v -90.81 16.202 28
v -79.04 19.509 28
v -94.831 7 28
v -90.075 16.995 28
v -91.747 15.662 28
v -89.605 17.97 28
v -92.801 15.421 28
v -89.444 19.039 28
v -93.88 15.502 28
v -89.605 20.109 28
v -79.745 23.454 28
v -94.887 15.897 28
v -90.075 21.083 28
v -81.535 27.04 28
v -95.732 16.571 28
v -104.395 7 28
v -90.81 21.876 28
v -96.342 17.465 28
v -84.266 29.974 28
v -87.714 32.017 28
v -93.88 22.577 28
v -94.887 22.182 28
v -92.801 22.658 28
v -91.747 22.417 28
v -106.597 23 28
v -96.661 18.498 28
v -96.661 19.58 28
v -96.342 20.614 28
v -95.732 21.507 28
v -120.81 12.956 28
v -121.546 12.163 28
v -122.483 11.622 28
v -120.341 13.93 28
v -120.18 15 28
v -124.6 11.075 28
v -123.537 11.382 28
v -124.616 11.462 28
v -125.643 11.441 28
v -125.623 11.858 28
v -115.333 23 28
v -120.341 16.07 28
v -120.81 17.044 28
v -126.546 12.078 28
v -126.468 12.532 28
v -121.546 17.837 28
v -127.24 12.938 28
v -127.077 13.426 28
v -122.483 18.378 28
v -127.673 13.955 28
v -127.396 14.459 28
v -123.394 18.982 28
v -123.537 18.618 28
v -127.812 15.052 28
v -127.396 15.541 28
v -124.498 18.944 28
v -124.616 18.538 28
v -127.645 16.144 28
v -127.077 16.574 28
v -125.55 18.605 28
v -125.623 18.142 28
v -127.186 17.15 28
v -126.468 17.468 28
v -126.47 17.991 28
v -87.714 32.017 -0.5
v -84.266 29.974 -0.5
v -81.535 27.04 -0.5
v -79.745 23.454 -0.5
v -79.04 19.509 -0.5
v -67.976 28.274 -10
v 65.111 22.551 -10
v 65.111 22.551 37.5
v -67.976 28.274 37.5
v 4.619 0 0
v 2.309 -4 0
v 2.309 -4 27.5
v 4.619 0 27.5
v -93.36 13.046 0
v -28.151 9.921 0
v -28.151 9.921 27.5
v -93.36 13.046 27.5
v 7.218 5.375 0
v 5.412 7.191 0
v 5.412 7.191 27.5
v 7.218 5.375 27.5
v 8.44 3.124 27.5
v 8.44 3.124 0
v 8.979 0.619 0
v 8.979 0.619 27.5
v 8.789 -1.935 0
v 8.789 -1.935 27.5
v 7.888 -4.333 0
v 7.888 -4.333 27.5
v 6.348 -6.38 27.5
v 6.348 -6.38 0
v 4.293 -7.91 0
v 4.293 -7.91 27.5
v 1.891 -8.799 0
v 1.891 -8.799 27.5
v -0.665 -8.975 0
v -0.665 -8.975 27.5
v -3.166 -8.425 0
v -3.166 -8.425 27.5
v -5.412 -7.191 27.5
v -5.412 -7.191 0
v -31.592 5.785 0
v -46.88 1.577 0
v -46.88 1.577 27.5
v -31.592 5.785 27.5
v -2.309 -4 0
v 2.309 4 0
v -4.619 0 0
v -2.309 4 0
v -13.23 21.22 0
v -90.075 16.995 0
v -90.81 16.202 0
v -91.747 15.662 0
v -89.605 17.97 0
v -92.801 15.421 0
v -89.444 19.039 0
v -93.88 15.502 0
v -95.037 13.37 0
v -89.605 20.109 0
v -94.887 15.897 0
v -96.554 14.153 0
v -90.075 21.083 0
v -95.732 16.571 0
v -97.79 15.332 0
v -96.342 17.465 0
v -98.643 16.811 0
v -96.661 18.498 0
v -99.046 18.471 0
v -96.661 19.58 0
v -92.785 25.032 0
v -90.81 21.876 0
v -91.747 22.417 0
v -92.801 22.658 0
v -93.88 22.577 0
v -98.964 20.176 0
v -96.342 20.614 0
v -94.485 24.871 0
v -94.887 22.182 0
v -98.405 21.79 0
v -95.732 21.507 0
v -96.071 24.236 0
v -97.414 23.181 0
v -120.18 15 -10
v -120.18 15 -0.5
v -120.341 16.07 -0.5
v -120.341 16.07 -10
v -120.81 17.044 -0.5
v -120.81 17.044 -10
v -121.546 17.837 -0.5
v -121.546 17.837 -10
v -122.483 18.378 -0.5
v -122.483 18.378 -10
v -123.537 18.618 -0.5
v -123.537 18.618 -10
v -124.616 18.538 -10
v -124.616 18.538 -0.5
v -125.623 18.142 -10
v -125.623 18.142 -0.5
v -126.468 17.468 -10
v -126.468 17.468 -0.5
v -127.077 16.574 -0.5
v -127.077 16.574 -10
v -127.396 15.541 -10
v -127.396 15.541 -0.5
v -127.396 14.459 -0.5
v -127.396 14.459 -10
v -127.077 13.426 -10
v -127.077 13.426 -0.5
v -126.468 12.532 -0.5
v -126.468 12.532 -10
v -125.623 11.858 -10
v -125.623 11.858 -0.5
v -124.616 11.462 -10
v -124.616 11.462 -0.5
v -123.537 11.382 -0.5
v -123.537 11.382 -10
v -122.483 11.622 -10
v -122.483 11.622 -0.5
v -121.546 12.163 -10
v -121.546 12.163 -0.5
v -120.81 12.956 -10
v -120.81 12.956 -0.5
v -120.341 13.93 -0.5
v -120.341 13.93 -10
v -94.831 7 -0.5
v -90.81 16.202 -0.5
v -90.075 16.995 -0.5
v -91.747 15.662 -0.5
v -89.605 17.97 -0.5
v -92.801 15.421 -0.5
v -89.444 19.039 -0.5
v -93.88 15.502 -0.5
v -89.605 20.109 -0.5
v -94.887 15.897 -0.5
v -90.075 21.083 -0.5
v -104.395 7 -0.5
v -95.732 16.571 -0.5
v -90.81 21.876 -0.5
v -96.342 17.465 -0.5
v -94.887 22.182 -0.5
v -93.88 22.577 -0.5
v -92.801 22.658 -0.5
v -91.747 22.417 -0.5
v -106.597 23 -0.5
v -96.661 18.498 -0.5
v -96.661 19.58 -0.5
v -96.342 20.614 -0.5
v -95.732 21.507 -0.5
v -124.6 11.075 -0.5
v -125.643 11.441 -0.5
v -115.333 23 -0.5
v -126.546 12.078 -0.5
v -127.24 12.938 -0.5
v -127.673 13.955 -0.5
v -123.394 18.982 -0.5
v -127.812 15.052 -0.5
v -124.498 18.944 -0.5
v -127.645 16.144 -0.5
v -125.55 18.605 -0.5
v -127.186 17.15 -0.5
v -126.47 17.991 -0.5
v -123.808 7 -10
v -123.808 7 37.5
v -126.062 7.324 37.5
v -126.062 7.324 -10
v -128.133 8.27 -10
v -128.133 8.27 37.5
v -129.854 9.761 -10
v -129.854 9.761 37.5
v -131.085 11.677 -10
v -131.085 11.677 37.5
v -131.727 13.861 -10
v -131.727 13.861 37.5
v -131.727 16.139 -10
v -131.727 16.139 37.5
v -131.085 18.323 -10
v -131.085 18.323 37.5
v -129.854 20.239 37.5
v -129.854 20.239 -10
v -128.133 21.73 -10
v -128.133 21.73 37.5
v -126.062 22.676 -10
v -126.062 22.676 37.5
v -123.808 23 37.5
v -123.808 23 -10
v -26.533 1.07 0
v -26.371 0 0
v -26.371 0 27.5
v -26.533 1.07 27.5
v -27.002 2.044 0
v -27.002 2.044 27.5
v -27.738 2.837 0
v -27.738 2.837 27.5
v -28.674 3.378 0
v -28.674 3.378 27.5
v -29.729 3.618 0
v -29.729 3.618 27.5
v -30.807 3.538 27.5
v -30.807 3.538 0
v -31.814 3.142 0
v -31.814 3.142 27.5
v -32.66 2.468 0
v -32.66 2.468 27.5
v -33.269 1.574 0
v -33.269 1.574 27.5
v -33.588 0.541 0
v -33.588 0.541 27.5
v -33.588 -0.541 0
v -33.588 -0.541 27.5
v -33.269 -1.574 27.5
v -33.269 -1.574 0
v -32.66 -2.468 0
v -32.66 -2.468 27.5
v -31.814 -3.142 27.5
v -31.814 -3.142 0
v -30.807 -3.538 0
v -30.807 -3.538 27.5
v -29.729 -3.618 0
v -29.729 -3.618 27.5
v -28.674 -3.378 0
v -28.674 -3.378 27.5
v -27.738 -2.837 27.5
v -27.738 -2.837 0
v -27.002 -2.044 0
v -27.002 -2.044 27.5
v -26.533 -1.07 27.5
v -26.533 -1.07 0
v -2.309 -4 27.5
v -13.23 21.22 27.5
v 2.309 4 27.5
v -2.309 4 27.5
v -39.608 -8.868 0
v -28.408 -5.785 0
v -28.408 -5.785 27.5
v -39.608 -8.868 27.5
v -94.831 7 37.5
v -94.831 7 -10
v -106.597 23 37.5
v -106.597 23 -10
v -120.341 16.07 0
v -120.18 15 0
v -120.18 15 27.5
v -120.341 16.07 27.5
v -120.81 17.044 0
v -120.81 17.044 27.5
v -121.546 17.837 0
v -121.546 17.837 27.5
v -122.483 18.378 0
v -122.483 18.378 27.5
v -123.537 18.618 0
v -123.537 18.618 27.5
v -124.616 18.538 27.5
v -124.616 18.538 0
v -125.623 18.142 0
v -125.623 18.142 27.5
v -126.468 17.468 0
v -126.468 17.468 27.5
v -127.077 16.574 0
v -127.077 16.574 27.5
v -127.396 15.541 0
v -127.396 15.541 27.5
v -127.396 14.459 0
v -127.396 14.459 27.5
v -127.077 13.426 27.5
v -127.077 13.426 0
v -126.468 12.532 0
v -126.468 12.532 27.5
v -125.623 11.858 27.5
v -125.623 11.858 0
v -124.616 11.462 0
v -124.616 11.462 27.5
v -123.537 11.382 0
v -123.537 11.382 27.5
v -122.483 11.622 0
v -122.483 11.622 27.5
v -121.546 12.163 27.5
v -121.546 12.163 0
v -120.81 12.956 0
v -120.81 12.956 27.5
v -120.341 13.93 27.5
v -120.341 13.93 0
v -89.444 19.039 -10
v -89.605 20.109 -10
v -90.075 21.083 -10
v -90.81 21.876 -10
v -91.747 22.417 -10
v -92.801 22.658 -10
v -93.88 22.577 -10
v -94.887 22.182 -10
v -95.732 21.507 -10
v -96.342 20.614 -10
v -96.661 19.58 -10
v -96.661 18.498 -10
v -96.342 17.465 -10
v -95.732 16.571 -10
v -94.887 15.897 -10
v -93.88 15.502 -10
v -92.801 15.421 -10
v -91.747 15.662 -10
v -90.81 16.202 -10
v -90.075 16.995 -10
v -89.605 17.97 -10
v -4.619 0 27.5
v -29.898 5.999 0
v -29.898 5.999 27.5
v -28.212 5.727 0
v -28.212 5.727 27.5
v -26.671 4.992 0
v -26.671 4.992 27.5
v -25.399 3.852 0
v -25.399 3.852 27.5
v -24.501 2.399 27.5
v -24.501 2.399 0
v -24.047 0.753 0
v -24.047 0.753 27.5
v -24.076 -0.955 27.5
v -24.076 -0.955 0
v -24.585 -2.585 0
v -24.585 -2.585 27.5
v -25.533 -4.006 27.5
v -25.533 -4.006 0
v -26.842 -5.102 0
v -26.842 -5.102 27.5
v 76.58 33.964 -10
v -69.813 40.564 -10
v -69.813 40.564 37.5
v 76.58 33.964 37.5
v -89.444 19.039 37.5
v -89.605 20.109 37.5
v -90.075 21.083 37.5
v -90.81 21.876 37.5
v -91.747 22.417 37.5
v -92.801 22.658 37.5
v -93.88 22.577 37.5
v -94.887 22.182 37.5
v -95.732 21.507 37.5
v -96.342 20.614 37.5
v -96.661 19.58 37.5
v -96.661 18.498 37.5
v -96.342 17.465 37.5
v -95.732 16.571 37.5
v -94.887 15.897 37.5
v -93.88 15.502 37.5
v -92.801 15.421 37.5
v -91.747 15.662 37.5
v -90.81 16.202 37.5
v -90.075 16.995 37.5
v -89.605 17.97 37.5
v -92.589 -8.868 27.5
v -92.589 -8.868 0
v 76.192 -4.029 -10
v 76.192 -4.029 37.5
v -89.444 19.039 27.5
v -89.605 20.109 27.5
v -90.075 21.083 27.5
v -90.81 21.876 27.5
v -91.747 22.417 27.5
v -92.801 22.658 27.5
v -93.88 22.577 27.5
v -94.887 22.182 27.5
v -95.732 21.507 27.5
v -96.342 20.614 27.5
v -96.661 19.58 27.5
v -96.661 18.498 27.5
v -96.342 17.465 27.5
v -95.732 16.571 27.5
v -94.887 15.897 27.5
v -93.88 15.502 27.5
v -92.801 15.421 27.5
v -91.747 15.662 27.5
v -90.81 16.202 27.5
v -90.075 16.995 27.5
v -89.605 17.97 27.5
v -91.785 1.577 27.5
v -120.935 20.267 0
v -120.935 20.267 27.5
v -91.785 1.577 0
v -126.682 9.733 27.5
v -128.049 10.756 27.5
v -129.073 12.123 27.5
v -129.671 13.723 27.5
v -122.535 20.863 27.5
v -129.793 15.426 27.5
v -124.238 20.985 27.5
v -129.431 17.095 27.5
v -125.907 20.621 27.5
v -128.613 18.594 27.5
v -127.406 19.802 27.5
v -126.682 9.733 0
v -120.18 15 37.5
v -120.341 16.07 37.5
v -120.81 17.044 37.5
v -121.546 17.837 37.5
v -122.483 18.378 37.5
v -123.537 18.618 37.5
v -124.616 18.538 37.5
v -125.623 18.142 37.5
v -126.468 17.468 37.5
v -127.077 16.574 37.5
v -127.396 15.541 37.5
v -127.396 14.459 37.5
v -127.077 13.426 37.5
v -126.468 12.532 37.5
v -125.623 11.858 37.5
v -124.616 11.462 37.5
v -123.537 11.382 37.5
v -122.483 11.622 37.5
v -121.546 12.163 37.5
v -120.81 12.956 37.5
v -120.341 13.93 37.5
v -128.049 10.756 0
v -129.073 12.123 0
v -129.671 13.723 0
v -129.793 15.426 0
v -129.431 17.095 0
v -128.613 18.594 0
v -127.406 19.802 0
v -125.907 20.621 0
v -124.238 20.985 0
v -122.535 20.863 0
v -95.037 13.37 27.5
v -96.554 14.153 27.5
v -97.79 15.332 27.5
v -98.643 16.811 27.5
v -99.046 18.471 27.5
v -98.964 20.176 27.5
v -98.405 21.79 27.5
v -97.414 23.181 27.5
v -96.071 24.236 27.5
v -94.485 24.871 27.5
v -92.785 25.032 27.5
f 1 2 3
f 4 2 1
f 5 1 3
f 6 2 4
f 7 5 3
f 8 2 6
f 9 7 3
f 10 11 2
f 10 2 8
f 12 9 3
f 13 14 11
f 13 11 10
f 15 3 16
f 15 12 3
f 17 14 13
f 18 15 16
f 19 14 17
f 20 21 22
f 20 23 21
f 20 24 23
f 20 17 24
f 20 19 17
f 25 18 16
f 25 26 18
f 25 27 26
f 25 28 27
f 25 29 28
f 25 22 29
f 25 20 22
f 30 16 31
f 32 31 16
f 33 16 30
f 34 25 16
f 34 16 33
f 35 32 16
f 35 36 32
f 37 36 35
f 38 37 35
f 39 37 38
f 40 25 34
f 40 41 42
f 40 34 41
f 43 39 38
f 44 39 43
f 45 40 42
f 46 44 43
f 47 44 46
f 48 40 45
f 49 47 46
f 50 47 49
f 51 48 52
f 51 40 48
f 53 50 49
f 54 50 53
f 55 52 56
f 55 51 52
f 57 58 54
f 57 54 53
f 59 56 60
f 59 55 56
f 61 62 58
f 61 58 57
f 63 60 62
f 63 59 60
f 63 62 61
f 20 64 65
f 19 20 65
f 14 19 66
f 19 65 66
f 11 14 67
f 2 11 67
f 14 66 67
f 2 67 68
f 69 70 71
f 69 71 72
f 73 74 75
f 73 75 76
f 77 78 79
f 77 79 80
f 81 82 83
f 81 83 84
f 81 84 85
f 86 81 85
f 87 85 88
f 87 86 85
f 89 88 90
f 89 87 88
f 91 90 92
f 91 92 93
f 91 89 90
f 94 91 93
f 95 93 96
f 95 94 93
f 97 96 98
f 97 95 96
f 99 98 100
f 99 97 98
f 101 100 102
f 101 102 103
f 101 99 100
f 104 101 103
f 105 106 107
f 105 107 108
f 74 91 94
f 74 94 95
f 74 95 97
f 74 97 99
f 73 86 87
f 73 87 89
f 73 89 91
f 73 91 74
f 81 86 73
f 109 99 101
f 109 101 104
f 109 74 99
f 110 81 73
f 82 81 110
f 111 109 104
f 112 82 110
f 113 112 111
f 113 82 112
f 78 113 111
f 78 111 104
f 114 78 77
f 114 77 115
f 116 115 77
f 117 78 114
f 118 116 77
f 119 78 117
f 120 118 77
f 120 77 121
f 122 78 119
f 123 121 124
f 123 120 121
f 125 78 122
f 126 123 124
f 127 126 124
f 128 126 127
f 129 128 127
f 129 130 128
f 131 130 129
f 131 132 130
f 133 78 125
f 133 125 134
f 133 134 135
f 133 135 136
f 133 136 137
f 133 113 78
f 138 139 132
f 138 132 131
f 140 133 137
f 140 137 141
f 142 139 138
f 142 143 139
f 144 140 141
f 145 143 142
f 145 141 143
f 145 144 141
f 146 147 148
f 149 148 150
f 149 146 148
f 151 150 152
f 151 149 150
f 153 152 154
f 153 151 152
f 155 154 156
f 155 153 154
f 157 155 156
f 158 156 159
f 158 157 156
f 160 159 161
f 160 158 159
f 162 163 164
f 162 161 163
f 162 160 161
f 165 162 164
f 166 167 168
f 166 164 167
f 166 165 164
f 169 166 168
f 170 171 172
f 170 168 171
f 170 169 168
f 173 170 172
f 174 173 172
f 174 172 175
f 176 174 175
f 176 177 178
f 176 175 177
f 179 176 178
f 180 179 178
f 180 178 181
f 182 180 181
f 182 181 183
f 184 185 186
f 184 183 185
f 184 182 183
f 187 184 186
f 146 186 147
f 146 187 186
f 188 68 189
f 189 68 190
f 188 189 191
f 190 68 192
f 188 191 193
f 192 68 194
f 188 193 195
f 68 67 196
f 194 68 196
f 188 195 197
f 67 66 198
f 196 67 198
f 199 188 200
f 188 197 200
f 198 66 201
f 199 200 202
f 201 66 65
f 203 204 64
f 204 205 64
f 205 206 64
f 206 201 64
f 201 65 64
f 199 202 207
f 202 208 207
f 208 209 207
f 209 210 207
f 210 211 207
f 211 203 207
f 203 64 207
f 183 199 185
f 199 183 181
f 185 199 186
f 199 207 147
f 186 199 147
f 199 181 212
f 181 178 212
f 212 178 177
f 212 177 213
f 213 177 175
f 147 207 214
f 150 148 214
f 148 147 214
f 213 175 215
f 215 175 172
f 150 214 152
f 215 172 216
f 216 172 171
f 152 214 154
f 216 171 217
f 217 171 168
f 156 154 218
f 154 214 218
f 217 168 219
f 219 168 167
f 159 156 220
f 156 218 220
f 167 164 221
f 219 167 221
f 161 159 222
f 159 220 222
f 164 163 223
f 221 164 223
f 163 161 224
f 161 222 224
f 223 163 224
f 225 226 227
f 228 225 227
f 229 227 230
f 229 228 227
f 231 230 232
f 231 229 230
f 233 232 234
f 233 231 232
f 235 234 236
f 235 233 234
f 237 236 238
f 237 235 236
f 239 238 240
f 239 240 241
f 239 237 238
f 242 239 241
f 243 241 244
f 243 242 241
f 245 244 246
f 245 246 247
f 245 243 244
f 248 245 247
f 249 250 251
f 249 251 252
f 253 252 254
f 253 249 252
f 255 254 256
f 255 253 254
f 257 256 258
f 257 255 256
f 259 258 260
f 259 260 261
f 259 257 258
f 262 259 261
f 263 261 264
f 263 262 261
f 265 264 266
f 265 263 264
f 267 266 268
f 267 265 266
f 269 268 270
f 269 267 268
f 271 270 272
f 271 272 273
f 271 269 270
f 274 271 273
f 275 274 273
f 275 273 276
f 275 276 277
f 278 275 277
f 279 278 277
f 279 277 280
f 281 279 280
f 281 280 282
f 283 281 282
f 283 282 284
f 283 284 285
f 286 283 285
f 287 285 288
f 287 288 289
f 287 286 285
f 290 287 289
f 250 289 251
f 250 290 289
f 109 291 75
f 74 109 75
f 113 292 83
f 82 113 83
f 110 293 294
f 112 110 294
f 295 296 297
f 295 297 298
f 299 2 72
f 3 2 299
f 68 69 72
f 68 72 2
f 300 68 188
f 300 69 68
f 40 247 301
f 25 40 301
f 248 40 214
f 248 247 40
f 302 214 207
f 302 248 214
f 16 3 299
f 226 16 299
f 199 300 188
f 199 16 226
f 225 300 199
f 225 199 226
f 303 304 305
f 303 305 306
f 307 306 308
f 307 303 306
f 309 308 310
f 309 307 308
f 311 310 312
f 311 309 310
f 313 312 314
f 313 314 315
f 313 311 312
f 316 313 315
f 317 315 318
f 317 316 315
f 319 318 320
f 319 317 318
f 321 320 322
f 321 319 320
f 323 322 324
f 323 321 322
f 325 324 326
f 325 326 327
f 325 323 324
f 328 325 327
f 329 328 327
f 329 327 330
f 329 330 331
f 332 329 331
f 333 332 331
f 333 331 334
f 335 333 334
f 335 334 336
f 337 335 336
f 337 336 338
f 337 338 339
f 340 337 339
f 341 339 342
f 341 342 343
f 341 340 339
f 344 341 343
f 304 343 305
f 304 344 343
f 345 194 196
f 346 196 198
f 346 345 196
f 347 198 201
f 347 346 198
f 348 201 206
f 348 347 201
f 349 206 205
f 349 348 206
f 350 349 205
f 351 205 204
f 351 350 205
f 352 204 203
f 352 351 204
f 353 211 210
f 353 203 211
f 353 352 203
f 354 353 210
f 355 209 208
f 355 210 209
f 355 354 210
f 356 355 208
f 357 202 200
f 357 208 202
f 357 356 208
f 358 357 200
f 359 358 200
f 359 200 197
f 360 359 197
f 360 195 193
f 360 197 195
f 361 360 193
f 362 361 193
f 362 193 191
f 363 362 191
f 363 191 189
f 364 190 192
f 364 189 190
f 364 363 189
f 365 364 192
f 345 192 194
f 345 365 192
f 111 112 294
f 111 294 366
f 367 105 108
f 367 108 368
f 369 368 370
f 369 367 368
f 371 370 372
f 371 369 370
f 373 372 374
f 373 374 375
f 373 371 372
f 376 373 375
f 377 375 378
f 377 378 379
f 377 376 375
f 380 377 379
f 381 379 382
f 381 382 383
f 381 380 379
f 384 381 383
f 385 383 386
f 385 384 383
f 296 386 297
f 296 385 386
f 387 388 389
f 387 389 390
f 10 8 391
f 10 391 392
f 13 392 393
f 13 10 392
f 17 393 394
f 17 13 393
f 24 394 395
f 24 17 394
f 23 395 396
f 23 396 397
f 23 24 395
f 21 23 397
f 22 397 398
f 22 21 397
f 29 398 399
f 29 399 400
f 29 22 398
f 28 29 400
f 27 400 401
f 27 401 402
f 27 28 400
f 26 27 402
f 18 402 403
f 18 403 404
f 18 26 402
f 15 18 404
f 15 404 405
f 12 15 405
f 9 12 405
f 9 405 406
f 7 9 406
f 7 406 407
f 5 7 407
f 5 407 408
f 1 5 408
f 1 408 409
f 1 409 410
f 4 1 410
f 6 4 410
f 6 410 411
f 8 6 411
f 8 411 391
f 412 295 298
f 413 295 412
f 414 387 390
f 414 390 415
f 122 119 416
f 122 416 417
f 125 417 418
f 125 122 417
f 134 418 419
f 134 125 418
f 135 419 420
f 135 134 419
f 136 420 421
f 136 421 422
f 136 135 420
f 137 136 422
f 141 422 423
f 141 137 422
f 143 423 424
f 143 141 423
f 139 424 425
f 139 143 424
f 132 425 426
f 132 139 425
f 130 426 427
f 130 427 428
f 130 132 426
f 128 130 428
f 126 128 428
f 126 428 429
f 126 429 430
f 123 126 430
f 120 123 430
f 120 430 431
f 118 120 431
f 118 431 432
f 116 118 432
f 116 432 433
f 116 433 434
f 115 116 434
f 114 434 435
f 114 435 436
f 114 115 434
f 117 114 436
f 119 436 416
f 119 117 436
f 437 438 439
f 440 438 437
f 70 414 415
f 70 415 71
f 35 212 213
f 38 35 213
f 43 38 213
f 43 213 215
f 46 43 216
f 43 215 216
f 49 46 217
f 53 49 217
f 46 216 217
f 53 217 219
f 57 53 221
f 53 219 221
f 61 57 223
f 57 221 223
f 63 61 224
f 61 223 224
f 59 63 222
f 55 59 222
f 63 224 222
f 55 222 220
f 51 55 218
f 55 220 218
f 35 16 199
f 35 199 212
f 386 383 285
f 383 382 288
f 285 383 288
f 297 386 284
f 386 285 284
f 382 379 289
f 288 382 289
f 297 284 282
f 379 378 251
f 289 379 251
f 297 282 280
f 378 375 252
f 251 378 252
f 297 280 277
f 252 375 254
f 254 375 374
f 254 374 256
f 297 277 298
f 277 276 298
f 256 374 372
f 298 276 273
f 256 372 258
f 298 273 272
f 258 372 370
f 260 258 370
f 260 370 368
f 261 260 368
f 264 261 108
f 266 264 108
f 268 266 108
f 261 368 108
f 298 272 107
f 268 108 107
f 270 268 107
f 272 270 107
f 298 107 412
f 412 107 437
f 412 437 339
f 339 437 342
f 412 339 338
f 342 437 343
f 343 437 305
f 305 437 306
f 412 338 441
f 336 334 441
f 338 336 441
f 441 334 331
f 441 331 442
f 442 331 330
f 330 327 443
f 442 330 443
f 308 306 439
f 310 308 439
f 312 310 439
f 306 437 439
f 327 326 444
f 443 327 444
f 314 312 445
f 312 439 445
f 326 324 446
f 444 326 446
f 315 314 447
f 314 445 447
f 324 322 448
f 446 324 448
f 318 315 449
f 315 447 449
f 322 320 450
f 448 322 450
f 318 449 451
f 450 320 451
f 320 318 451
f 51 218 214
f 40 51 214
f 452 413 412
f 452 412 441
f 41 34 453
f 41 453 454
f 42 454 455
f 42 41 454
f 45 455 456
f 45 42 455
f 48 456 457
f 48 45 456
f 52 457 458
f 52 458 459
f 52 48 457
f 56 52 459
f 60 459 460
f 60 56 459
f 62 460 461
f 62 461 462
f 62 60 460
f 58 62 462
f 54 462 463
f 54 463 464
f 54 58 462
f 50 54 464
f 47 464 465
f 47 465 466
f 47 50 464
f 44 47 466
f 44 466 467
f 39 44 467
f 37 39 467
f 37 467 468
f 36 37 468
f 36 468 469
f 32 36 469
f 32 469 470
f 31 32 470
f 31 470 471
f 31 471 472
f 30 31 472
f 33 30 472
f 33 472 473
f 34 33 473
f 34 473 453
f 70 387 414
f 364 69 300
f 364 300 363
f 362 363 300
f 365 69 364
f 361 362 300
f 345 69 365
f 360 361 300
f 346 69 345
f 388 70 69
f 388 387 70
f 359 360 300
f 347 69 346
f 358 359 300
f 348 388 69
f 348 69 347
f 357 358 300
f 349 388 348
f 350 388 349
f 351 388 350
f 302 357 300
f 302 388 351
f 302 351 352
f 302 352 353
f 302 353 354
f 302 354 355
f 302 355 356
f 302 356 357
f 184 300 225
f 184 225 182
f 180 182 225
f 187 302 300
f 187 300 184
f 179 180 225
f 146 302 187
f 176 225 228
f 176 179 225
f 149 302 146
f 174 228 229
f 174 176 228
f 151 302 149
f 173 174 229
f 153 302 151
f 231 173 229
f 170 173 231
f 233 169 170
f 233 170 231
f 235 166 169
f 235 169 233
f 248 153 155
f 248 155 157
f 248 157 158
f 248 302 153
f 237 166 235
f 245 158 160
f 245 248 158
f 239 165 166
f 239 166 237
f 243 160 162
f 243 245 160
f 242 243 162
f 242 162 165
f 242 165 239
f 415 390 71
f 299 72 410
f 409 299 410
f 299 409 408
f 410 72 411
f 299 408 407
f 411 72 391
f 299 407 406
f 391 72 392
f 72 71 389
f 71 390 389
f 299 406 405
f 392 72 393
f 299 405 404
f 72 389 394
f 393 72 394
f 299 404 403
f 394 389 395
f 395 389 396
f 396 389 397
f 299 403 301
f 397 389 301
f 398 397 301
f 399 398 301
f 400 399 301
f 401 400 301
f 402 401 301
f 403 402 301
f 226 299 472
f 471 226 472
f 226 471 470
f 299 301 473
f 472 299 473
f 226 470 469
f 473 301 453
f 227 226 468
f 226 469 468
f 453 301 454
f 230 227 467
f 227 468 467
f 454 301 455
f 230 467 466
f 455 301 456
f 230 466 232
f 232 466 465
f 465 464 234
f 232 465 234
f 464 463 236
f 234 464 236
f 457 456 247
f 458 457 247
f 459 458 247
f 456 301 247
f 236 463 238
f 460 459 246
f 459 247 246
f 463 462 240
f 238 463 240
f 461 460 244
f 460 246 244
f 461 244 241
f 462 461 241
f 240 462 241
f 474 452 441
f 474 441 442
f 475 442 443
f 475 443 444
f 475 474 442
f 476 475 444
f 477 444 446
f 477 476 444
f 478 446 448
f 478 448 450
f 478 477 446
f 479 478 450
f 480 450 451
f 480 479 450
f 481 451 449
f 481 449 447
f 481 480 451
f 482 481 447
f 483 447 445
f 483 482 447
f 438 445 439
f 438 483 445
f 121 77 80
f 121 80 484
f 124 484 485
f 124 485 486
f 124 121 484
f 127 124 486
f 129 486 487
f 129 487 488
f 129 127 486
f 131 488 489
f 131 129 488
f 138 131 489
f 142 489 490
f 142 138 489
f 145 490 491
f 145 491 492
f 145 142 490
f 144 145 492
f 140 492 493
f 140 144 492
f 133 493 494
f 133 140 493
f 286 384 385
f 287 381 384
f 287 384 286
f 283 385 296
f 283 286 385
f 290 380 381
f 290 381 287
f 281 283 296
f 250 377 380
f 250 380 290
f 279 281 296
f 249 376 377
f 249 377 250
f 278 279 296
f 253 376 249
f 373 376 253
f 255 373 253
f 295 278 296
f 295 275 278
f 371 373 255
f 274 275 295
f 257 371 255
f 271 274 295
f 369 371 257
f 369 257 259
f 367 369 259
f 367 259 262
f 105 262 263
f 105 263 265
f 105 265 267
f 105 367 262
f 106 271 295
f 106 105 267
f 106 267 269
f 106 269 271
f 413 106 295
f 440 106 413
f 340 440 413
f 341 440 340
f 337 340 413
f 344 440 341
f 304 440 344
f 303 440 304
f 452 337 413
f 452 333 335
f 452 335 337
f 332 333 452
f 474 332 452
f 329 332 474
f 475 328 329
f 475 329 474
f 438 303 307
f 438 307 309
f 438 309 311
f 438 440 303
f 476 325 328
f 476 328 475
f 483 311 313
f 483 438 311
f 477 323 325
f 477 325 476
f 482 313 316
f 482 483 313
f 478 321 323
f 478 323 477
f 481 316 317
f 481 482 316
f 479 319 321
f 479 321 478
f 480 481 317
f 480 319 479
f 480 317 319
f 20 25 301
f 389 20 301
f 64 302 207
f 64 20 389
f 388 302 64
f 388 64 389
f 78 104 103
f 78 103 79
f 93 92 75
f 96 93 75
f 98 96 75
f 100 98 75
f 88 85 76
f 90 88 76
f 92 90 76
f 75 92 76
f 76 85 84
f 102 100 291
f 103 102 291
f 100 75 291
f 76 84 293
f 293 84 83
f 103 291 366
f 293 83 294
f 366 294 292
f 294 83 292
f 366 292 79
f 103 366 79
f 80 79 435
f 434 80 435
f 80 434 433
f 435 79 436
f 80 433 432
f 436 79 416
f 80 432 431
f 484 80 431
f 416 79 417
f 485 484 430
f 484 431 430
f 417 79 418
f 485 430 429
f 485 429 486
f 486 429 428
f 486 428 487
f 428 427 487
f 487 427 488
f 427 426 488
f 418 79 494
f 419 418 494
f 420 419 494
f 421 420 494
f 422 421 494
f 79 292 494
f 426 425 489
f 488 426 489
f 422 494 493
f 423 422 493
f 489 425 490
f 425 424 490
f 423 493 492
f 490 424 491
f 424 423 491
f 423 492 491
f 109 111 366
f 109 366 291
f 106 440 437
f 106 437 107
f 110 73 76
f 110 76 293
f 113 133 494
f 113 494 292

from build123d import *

# Parameters (mm, degrees)
SKETCH5_R                = 3.628504089
BOSS_EXTRUDE3_DEPTH      = 27.5
BOSS_EXTRUDE3_2_DEPTH    = 27.5
BOSS_EXTRUDE4_DEPTH      = 23.75
BOSS_EXTRUDE4_DEPTH_BACK = 23.75
SKETCH6_R                = 3.628504089
CUT_EXTRUDE2_DEPTH       = 14.25
CUT_EXTRUDE2_DEPTH_BACK  = 14.25


with BuildPart() as part:
    # Sketch5 → Boss-Extrude3 (new body)
    with BuildSketch(Plane.XY):
        with BuildLine():
            Line((-120.934685686, 20.267091554), (-91.785043878, 1.576891431))
            Line((-91.785043878, 1.576891431), (-46.879701458, 1.576891431))
            Line((-46.879701458, 1.576891431), (-31.592321802, 5.78485188))
            ThreePointArc((-31.592321802, 5.78485188), (-24.21514812, 1.592321802), (-28.407678198, -5.78485188))
            Line((-28.407678198, -5.78485188), (-39.607557444, -8.867698645))
            Line((-39.607557444, -8.867698645), (-92.588788243, -8.867698645))
            Line((-92.588788243, -8.867698645), (-126.681944707, 9.732908446))
            ThreePointArc((-126.681944707, 9.732908446), (-129.07540675, 17.87362951), (-120.934685686, 20.267091554))
        make_face()
        with Locations((-123.808315196, 15)):
            Circle(SKETCH5_R, mode=Mode.SUBTRACT)
        with Locations((-30, 0)):
            Circle(SKETCH5_R, mode=Mode.SUBTRACT)
    extrude(amount=BOSS_EXTRUDE3_DEPTH)


with BuildPart() as body_2:
    # Sketch5 → Boss-Extrude3 2 (new body)
    with BuildSketch(Plane.XY):
        with BuildLine():
            Line((-5.4116656, -7.191236016), (-28.151470977, 9.921291265))
            Line((-28.151470977, 9.921291265), (-93.359787057, 13.046109847))
            ThreePointArc((-93.359787057, 13.046109847), (-99.065716006, 19.326426306), (-92.785399546, 25.032355255))
            Line((-92.785399546, 25.032355255), (-13.230357407, 21.220033624))
            Line((-13.230357407, 21.220033624), (5.4116656, 7.191236016))
            ThreePointArc((5.4116656, 7.191236016), (7.191236016, -5.4116656), (-5.4116656, -7.191236016))
        make_face()
        with Locations((-93.072593302, 19.039232551)):
            Circle(SKETCH5_R, mode=Mode.SUBTRACT)
        Polygon((4.618802154, 0), (2.309401077, 4), (-2.309401077, 4), (-4.618802154, 0), (-2.309401077, -4), (2.309401077, -4), align=None, mode=Mode.SUBTRACT)
    extrude(amount=BOSS_EXTRUDE3_2_DEPTH)


with BuildPart() as body_3:
    # Sketch6 → Boss-Extrude4 (new, two sides: drawn at the far end of the back side and taken through both)
    with BuildSketch(Plane.XY.offset(13.75).offset(-BOSS_EXTRUDE4_DEPTH_BACK)):
        with BuildLine():
            Line((76.191684804, -4.029010555), (65.11100303, 22.550984249))
            Line((65.11100303, 22.550984249), (-67.97614227, 28.273511334))
            Line((-67.97614227, 28.273511334), (-94.831118395, 7))
            Line((-94.831118395, 7), (-123.808315196, 7))
            ThreePointArc((-123.808315196, 7), (-131.808315196, 15), (-123.808315196, 23))
            Line((-123.808315196, 23), (-106.597039785, 23))
            Line((-106.597039785, 23), (-69.813407938, 40.564082784))
            Line((-69.813407938, 40.564082784), (76.579517734, 33.963718739))
            Line((76.579517734, 33.963718739), (76.191684804, -4.029010555))
        make_face()
        with Locations((-93.072593302, 19.039232551)):
            Circle(SKETCH6_R, mode=Mode.SUBTRACT)
        with Locations((-123.808315196, 15)):
            Circle(SKETCH6_R, mode=Mode.SUBTRACT)
    extrude(amount=BOSS_EXTRUDE4_DEPTH + BOSS_EXTRUDE4_DEPTH_BACK)

    # Sketch7 → Cut-Extrude2 (cut, two sides: drawn at the far end of the back side and taken through both)
    with BuildSketch(Plane.XY.offset(13.75).offset(-CUT_EXTRUDE2_DEPTH_BACK)):
        with BuildLine():
            Line((-123.39375762, 18.98225228), (-95.551874481, 32.858901158))
            ThreePointArc((-95.551874481, 32.858901158), (-79.033103969, 18.888186683), (-95.848627976, 5.276104016))
            Line((-95.848627976, 5.276104016), (-124.599937084, 11.075267398))
            ThreePointArc((-124.599937084, 11.075267398), (-127.766300398, 15.603775085), (-123.39375762, 18.98225228))
        make_face()
    extrude(amount=CUT_EXTRUDE2_DEPTH + CUT_EXTRUDE2_DEPTH_BACK, mode=Mode.SUBTRACT)


solid = Compound([part.part, body_2.part, body_3.part])
